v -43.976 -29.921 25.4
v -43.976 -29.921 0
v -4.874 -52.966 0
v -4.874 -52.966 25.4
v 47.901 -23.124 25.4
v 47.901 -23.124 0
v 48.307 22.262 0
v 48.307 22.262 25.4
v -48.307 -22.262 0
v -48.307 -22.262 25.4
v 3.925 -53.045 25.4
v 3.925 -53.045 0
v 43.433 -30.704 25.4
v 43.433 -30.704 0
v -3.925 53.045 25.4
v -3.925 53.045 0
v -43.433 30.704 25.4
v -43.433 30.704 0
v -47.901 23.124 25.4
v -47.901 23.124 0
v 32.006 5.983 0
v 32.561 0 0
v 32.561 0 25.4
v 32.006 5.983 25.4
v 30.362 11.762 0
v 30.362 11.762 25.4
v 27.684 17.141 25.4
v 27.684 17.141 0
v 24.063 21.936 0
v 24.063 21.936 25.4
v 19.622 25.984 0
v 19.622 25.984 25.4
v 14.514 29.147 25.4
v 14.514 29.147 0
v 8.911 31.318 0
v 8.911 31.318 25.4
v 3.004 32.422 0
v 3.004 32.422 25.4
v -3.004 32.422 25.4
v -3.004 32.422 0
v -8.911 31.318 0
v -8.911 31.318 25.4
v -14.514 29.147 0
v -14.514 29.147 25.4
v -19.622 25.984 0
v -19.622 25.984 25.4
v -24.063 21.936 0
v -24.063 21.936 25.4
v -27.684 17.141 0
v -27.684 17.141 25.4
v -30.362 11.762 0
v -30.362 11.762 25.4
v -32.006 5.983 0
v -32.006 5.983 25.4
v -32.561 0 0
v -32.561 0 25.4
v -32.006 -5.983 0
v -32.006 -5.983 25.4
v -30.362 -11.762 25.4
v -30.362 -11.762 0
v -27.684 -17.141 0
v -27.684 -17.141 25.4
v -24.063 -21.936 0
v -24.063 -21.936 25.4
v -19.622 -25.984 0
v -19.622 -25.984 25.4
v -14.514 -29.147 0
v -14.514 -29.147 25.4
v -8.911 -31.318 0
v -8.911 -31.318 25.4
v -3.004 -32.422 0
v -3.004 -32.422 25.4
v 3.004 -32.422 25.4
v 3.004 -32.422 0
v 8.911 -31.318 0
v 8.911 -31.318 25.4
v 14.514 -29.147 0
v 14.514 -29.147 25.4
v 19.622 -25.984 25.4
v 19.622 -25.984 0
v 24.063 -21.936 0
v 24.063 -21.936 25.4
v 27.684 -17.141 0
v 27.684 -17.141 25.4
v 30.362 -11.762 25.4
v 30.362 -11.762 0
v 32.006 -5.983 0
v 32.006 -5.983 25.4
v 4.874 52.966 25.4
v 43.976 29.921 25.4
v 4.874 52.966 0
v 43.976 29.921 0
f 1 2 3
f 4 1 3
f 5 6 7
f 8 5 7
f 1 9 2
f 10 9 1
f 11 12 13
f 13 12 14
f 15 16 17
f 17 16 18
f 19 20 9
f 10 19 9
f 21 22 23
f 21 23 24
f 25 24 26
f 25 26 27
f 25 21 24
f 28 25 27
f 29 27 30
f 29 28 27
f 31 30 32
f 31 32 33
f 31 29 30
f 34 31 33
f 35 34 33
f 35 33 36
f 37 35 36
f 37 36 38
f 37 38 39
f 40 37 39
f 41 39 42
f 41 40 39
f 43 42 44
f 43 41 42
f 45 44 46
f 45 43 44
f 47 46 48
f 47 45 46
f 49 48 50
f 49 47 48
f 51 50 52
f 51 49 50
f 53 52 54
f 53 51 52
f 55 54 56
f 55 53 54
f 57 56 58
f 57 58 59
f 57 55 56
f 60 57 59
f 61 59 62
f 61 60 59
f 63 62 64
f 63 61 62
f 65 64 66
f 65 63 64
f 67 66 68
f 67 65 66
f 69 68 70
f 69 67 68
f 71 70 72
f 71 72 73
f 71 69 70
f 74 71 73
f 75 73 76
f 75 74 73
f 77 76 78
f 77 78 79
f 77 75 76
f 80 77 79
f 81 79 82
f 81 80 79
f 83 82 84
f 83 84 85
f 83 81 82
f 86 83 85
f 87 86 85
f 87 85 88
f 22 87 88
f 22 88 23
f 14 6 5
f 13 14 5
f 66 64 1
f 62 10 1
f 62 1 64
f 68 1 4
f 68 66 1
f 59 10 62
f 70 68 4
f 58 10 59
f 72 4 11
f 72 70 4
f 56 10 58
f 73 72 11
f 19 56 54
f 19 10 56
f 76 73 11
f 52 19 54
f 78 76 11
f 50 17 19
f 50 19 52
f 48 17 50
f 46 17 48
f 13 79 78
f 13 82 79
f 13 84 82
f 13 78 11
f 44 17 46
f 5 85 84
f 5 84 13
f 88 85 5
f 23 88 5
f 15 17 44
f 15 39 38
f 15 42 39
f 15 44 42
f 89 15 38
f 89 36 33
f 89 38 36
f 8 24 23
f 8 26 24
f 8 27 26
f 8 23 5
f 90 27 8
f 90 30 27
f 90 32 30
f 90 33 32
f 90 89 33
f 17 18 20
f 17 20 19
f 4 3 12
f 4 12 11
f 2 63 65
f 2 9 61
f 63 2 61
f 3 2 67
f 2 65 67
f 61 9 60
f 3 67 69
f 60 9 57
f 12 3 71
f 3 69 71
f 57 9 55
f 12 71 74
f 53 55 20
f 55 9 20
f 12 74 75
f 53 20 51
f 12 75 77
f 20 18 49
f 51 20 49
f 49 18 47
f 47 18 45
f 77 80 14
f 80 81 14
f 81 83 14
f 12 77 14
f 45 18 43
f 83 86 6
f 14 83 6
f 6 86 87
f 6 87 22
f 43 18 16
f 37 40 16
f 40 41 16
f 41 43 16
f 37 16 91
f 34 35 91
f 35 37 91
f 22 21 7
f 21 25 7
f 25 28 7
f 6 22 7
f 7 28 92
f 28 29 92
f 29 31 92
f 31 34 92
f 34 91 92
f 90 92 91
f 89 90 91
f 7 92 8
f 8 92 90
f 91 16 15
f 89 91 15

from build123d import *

# Parameters (mm, degrees)
F0_R     = 32.560597
F1_DEPTH = 25.4
F2_SIZE2 = 5.08
F2_SIZE  = 5.08


with BuildPart() as f1:
    # F0 (on Top) → F1 (new body)
    with BuildSketch(Plane.XY):
        Polygon((-0.49722, -55.545455), (47.855165, -28.203333), (48.352385, 27.342122), (0.49722, 55.545455), (-47.855165, 28.203333), (-48.352385, -27.342122), align=None)
        Circle(F0_R, mode=Mode.SUBTRACT)
    extrude(amount=F1_DEPTH)

    # F2
    f2_edges = [f1.edges().sort_by_distance(p)[0] for p in [
        (-48.352385, -27.342122, 12.7),
        (-47.855165, 28.203333, 12.7),
        (-0.49722, -55.545455, 12.7),
        (0.49722, 55.545455, 12.7),
        (48.352385, 27.342122, 12.7),
        (47.855165, -28.203333, 12.7),
    ]]
    chamfer(f2_edges, length=F2_SIZE, length2=F2_SIZE2)


solid = f1.part
